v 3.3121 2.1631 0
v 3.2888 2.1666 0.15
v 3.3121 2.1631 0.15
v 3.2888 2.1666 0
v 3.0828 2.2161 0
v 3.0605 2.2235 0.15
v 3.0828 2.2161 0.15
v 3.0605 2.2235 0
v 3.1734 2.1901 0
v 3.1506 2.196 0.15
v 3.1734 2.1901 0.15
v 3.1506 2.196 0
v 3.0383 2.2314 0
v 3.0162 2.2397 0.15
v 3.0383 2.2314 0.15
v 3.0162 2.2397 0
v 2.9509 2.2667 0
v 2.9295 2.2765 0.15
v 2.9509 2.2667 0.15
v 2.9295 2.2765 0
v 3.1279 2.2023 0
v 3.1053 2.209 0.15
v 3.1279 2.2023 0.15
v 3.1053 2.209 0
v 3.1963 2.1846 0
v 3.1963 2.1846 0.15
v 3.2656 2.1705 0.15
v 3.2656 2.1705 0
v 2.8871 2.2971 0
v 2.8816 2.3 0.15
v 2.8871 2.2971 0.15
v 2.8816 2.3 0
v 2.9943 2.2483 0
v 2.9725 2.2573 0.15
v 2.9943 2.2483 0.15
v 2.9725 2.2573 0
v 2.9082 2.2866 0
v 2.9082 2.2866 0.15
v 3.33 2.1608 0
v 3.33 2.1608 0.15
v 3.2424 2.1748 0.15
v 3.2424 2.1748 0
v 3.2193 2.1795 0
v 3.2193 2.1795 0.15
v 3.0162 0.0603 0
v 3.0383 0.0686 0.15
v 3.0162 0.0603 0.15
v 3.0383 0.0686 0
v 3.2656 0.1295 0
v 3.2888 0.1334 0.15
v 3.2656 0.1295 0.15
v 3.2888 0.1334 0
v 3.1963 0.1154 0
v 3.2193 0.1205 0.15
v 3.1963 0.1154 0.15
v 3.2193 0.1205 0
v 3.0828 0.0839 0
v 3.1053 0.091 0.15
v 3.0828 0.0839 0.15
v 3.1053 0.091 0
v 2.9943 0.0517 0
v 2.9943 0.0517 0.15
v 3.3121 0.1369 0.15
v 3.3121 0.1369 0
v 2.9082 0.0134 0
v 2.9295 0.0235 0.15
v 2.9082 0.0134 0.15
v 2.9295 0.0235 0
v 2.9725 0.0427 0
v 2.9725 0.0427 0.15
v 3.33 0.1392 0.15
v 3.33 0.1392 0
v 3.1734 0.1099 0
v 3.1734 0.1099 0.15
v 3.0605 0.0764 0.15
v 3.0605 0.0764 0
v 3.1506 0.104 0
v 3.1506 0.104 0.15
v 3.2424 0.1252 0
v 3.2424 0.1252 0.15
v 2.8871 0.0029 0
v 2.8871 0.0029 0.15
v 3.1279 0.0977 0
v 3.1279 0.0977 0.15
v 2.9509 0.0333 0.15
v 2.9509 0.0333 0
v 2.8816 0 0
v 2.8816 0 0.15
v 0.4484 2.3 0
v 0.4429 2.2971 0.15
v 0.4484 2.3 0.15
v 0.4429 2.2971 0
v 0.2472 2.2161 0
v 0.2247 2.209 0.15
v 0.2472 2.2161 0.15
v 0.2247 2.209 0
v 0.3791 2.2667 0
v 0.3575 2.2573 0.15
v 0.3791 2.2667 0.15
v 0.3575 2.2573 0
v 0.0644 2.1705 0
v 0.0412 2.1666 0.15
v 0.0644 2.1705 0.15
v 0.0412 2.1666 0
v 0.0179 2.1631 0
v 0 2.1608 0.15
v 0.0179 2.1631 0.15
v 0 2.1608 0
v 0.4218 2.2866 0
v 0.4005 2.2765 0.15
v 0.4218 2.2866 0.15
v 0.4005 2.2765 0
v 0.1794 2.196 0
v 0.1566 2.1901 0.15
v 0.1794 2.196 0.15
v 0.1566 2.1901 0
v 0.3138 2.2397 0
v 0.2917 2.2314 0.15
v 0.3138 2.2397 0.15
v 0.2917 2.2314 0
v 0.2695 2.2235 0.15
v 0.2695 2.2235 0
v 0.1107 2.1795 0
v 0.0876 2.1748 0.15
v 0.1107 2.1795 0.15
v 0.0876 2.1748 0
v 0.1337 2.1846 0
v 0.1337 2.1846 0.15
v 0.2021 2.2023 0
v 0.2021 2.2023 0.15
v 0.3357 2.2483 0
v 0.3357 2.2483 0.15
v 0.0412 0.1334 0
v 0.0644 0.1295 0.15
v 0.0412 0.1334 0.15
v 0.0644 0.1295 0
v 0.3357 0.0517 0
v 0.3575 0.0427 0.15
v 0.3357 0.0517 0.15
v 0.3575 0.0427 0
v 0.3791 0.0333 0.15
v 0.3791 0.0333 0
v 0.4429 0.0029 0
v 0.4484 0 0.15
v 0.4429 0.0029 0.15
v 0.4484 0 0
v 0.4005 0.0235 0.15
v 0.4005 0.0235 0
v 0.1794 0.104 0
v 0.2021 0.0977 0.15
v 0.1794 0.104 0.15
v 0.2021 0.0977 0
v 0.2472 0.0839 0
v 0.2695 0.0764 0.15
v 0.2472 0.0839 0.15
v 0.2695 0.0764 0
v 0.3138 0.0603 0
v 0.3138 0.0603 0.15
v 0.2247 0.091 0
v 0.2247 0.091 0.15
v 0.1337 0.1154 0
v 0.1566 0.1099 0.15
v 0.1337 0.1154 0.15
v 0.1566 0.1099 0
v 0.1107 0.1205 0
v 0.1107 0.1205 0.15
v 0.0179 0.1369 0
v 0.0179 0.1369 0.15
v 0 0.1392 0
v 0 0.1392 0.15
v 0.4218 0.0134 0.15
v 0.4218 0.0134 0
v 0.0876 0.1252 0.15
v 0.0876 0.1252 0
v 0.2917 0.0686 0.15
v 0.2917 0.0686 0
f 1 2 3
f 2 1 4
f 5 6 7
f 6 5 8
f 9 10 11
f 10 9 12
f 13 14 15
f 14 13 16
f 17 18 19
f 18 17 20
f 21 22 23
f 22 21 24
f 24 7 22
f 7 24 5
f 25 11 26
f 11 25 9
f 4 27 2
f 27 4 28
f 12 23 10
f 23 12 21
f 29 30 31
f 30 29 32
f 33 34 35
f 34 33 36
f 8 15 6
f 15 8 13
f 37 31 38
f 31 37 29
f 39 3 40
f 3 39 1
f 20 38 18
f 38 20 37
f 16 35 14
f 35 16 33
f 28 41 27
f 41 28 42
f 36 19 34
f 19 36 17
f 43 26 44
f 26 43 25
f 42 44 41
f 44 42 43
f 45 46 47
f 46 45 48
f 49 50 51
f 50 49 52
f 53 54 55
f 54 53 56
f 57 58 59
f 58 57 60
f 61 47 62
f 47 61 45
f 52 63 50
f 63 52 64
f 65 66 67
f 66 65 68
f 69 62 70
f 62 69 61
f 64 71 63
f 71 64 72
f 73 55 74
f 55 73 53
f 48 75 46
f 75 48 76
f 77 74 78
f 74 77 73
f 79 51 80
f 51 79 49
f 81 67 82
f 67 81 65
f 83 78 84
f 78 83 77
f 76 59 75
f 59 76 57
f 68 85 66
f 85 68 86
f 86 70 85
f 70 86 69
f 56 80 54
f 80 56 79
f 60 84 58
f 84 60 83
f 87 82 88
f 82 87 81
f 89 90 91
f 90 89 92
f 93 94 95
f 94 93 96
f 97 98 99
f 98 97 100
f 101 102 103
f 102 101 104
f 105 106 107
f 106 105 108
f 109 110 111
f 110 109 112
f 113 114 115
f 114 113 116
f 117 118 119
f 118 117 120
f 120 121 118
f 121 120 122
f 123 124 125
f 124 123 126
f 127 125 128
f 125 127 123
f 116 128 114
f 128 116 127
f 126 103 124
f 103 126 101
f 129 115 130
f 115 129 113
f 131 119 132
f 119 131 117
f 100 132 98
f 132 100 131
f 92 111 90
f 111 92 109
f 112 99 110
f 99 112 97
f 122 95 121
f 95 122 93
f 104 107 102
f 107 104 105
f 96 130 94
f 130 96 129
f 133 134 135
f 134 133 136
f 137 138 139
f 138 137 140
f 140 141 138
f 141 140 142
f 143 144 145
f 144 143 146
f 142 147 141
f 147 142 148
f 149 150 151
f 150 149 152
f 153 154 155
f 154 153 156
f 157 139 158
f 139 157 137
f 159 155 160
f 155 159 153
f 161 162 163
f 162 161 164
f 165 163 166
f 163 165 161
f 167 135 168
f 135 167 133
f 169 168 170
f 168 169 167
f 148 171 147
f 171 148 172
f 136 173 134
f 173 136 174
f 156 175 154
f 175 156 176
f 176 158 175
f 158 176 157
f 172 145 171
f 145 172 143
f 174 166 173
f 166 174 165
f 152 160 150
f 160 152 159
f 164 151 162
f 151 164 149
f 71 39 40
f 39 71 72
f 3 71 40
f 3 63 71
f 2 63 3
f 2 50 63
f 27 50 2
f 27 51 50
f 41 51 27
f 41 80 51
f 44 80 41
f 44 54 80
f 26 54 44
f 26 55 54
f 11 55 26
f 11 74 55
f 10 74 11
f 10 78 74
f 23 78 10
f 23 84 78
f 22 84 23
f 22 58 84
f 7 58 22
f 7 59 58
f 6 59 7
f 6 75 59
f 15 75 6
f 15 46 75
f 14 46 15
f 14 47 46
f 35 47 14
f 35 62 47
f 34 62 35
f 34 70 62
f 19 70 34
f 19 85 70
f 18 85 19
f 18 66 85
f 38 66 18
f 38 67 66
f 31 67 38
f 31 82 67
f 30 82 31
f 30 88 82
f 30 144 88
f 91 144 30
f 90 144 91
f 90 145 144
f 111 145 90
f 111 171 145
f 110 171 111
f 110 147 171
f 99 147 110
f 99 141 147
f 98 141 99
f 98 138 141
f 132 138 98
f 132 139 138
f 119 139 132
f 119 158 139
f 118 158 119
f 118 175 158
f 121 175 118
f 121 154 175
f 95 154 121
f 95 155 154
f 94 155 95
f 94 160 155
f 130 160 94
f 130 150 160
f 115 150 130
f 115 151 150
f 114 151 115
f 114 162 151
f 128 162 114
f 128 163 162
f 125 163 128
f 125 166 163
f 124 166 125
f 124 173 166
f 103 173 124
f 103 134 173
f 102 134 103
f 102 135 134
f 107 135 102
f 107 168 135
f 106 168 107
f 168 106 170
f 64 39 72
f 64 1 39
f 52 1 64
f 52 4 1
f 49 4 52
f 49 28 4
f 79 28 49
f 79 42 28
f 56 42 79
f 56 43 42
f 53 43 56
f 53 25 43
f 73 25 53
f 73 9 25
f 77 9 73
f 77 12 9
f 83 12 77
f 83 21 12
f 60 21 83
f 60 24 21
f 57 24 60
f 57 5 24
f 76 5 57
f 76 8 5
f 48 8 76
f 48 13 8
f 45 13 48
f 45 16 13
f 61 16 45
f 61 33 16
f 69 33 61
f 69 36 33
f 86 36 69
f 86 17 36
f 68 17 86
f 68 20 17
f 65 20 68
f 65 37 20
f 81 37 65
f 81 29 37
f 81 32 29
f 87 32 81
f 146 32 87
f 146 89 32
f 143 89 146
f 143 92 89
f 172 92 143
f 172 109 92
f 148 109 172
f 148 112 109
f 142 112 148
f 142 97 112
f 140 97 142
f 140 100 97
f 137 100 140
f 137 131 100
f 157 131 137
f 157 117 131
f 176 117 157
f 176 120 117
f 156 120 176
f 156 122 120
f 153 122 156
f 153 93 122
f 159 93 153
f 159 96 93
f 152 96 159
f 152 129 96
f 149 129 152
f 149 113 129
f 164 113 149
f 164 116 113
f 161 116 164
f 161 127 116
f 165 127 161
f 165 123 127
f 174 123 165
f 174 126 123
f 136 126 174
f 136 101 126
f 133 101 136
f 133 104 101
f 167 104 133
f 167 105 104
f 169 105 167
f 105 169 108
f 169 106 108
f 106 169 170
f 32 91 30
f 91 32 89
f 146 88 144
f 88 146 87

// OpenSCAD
$fa=1;
$fs=0.01;

// Constants
board_x = 3.33;  // Length
board_y = 2.3;  // Width
board_z = .15; // Thickness
mount_hole_d = 2.7; // Mounting hole diameter
mount_hole_offset_x = 3.5; // Distance from board edge
mount_hole_offset_y = 3.5; // Distance from board edge

module rp5() {
    // Raspberry Pi 5 Model in OpenSCAD
    // Simplified for fitting and enclosure design
    usb_ports();
    hdmi_ports();
    gpio_header();
}
//rp5();

// Function to place mounting holes
module mount_holes() {
    for (x = [mount_hole_offset_x, board_x - mount_hole_offset_x])
    for (y = [mount_hole_offset_y, board_y - mount_hole_offset_y]) {
        translate([x, y, 0])
        cylinder(h = 5, d = mount_hole_d, center = true);
    }
}

// Board shape
module board() {
    color("green")
    cube([board_x, board_y, board_z]);
}

// USB Ports
module usb_ports() {
    color("silver")
    translate([board_x - 15, board_y - 16, board_z])
    cube([15, 16, 10]);
}

// HDMI Ports
module hdmi_ports() {
    color("black")
    translate([board_x - 40, board_y - 10, board_z])
    cube([15, 10, 5]);
}

// GPIO Header
module gpio_header() {
    color("black")
    translate([2, board_y - 5, board_z])
    cube([52, 5, 10]);
}

// Assemble the Raspberry Pi 5 model
difference() {
    board();
    mount_holes();
}
